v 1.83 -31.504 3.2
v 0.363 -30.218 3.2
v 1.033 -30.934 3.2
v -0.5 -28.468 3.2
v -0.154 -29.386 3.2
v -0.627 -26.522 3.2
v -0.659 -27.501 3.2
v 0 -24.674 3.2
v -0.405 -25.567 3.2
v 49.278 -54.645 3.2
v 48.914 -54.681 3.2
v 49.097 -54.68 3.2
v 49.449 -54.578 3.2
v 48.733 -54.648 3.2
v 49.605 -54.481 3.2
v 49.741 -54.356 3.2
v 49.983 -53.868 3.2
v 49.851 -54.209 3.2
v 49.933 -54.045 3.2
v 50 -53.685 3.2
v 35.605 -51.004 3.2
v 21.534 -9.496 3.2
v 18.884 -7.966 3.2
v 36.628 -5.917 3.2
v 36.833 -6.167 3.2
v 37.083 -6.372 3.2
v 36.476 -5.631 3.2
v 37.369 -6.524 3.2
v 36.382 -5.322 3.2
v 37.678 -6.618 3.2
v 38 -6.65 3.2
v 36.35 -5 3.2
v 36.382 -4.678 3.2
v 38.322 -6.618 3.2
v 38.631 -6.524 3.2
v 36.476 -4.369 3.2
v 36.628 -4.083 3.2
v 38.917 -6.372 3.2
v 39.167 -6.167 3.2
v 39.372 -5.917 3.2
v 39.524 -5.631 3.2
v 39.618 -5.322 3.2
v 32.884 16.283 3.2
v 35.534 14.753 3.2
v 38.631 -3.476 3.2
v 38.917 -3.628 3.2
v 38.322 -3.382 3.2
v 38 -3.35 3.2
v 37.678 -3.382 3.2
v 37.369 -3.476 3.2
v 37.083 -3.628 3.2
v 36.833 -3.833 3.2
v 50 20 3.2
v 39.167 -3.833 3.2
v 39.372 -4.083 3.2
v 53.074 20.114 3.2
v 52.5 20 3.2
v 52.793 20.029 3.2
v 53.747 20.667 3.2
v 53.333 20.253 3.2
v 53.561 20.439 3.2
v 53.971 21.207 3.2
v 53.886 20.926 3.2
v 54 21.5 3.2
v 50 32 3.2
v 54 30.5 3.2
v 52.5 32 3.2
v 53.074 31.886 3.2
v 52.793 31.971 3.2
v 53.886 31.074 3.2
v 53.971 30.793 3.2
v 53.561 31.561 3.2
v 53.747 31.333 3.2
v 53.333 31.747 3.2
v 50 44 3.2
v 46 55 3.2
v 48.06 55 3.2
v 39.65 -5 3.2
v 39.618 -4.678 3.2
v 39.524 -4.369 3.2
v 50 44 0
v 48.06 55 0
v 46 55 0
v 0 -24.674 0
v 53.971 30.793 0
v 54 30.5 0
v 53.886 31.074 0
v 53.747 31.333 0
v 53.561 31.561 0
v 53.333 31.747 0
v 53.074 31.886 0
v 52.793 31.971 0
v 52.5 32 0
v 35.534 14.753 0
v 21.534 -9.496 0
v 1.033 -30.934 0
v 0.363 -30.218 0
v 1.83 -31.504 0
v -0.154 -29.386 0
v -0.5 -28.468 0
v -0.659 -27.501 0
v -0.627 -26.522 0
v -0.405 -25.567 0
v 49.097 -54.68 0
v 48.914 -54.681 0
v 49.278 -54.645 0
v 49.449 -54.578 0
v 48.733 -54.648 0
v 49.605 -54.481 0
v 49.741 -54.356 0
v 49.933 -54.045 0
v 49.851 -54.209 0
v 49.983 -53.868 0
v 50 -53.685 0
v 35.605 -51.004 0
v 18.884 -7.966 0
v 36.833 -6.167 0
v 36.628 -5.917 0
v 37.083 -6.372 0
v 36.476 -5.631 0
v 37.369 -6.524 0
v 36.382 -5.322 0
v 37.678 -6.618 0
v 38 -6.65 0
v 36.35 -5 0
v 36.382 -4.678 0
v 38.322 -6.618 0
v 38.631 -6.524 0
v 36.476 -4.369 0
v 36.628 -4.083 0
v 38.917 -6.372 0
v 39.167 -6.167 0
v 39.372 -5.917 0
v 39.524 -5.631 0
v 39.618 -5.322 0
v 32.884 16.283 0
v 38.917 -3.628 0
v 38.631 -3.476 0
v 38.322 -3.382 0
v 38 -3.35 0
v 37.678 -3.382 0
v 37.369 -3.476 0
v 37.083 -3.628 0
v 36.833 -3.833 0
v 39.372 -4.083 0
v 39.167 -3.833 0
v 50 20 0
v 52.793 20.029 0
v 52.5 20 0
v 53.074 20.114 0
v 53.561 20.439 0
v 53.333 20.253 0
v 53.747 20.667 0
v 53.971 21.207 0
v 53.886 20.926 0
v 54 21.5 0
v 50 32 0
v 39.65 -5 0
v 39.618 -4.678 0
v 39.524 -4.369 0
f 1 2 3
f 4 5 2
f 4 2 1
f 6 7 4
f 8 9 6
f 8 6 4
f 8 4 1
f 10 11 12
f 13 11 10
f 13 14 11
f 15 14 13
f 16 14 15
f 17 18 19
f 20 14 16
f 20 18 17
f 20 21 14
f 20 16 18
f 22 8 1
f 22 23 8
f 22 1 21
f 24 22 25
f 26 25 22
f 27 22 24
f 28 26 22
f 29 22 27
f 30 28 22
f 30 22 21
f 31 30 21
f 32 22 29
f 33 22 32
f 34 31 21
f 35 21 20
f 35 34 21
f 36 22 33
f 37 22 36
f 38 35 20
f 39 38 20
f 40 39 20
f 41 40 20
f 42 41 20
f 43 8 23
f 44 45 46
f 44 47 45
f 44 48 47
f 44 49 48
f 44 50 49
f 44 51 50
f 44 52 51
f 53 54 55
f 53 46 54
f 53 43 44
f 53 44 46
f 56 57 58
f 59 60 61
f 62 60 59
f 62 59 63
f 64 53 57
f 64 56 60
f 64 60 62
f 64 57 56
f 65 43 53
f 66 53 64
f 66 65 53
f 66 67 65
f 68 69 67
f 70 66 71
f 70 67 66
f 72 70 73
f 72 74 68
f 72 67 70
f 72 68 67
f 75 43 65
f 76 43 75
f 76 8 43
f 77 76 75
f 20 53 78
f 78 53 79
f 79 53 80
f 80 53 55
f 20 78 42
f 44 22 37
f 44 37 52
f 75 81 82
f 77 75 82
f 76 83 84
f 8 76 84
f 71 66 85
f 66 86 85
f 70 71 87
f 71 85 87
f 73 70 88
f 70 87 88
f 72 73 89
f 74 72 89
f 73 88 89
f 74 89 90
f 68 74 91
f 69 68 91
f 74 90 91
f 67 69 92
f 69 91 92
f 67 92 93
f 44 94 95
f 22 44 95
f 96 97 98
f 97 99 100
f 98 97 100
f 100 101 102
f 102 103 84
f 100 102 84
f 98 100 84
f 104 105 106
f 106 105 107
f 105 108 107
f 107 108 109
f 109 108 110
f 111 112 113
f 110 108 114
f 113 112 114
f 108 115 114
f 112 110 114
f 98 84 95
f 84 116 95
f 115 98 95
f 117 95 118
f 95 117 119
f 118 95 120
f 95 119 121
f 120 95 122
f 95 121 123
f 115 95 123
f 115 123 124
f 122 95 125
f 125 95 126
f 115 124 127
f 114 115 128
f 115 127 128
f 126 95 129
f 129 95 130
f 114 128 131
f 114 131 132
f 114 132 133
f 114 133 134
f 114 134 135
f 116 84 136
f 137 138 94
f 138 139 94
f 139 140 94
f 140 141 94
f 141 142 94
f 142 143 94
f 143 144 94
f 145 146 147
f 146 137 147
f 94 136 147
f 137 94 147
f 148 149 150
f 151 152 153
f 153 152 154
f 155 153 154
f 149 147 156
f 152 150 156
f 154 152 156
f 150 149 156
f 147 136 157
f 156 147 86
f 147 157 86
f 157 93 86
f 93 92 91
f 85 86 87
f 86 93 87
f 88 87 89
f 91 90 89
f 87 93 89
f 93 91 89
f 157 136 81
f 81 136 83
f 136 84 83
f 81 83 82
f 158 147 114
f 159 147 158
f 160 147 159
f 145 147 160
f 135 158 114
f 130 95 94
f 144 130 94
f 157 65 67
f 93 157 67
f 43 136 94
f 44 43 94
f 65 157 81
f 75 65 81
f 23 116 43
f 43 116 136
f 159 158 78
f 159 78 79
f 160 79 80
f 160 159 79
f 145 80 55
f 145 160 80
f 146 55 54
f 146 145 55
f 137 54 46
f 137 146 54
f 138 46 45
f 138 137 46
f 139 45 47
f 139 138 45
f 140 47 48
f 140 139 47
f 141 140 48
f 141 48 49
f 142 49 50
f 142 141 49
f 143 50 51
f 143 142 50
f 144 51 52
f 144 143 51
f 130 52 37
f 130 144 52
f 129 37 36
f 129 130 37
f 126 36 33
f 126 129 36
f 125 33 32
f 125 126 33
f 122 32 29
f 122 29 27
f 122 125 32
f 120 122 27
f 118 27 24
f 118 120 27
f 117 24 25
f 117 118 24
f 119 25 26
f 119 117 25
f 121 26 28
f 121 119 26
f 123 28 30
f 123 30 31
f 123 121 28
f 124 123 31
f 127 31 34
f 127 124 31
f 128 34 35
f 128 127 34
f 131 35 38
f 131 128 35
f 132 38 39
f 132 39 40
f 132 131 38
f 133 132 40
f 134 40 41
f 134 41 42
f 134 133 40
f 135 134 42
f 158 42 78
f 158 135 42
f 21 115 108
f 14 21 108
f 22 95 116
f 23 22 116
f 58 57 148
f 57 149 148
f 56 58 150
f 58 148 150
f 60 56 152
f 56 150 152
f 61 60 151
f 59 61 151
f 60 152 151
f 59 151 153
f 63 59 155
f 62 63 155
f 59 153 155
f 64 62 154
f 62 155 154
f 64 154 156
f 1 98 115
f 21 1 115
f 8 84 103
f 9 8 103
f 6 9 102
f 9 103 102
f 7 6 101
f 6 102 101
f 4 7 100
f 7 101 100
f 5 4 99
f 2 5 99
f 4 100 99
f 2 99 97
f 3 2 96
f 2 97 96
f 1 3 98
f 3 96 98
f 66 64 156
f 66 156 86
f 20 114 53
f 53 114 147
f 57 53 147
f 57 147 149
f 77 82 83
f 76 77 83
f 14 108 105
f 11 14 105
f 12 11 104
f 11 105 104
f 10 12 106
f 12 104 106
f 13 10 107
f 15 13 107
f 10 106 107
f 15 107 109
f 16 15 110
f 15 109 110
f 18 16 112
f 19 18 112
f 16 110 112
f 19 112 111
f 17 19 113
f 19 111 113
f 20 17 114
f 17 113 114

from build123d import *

# Parameters (mm, degrees)
SKETCH1_R           = 1.65
BOSS_EXTRUDE1_DEPTH = 3.2
SKETCH2_W           = 4
SKETCH2_H           = 12
BOSS_EXTRUDE2_DEPTH = 3.2
FILLET1_R           = 1.5


with BuildPart() as part:
    # Sketch1 → Boss-Extrude1 (new body)
    with BuildSketch(Plane.XY):
        with BuildLine():
            Line((1.830127019, -31.504464167), (35.605117766, -51.004464167))
            Line((35.605117766, -51.004464167), (48.732545217, -54.648197122))
            ThreePointArc((48.732545217, -54.648197122), (49.6052046, -54.480696676), (50, -53.68462671))
            Line((50, -53.68462671), (50, 44))
            Line((50, 44), (48.060403212, 55))
            Line((48.060403212, 55), (46, 55))
            Line((46, 55), (0, -24.674337148))
            ThreePointArc((0, -24.674337148), (-0.499502113, -28.468432374), (1.830127019, -31.504464167))
        make_face()
        with Locations((38, -5)):
            Circle(SKETCH1_R, mode=Mode.SUBTRACT)
        Polygon((18.88414205, -7.96604366), (32.88414205, 16.282667646), (35.534179786, 14.752667646), (21.534179786, -9.49604366), align=None, mode=Mode.SUBTRACT)
    extrude(amount=BOSS_EXTRUDE1_DEPTH)

    # Sketch2 → Boss-Extrude2 (add)
    with BuildSketch(Plane.XY.offset(3.2)):
        with Locations((52, 26)):
            Rectangle(SKETCH2_W, SKETCH2_H)
    extrude(amount=-BOSS_EXTRUDE2_DEPTH)

    # Fillet1
    fillet1_edges = [part.edges().sort_by_distance(p)[0] for p in [
        (54, 32, 1.6),
        (54, 20, 1.6),
    ]]
    fillet(fillet1_edges, radius=FILLET1_R)


solid = part.part
